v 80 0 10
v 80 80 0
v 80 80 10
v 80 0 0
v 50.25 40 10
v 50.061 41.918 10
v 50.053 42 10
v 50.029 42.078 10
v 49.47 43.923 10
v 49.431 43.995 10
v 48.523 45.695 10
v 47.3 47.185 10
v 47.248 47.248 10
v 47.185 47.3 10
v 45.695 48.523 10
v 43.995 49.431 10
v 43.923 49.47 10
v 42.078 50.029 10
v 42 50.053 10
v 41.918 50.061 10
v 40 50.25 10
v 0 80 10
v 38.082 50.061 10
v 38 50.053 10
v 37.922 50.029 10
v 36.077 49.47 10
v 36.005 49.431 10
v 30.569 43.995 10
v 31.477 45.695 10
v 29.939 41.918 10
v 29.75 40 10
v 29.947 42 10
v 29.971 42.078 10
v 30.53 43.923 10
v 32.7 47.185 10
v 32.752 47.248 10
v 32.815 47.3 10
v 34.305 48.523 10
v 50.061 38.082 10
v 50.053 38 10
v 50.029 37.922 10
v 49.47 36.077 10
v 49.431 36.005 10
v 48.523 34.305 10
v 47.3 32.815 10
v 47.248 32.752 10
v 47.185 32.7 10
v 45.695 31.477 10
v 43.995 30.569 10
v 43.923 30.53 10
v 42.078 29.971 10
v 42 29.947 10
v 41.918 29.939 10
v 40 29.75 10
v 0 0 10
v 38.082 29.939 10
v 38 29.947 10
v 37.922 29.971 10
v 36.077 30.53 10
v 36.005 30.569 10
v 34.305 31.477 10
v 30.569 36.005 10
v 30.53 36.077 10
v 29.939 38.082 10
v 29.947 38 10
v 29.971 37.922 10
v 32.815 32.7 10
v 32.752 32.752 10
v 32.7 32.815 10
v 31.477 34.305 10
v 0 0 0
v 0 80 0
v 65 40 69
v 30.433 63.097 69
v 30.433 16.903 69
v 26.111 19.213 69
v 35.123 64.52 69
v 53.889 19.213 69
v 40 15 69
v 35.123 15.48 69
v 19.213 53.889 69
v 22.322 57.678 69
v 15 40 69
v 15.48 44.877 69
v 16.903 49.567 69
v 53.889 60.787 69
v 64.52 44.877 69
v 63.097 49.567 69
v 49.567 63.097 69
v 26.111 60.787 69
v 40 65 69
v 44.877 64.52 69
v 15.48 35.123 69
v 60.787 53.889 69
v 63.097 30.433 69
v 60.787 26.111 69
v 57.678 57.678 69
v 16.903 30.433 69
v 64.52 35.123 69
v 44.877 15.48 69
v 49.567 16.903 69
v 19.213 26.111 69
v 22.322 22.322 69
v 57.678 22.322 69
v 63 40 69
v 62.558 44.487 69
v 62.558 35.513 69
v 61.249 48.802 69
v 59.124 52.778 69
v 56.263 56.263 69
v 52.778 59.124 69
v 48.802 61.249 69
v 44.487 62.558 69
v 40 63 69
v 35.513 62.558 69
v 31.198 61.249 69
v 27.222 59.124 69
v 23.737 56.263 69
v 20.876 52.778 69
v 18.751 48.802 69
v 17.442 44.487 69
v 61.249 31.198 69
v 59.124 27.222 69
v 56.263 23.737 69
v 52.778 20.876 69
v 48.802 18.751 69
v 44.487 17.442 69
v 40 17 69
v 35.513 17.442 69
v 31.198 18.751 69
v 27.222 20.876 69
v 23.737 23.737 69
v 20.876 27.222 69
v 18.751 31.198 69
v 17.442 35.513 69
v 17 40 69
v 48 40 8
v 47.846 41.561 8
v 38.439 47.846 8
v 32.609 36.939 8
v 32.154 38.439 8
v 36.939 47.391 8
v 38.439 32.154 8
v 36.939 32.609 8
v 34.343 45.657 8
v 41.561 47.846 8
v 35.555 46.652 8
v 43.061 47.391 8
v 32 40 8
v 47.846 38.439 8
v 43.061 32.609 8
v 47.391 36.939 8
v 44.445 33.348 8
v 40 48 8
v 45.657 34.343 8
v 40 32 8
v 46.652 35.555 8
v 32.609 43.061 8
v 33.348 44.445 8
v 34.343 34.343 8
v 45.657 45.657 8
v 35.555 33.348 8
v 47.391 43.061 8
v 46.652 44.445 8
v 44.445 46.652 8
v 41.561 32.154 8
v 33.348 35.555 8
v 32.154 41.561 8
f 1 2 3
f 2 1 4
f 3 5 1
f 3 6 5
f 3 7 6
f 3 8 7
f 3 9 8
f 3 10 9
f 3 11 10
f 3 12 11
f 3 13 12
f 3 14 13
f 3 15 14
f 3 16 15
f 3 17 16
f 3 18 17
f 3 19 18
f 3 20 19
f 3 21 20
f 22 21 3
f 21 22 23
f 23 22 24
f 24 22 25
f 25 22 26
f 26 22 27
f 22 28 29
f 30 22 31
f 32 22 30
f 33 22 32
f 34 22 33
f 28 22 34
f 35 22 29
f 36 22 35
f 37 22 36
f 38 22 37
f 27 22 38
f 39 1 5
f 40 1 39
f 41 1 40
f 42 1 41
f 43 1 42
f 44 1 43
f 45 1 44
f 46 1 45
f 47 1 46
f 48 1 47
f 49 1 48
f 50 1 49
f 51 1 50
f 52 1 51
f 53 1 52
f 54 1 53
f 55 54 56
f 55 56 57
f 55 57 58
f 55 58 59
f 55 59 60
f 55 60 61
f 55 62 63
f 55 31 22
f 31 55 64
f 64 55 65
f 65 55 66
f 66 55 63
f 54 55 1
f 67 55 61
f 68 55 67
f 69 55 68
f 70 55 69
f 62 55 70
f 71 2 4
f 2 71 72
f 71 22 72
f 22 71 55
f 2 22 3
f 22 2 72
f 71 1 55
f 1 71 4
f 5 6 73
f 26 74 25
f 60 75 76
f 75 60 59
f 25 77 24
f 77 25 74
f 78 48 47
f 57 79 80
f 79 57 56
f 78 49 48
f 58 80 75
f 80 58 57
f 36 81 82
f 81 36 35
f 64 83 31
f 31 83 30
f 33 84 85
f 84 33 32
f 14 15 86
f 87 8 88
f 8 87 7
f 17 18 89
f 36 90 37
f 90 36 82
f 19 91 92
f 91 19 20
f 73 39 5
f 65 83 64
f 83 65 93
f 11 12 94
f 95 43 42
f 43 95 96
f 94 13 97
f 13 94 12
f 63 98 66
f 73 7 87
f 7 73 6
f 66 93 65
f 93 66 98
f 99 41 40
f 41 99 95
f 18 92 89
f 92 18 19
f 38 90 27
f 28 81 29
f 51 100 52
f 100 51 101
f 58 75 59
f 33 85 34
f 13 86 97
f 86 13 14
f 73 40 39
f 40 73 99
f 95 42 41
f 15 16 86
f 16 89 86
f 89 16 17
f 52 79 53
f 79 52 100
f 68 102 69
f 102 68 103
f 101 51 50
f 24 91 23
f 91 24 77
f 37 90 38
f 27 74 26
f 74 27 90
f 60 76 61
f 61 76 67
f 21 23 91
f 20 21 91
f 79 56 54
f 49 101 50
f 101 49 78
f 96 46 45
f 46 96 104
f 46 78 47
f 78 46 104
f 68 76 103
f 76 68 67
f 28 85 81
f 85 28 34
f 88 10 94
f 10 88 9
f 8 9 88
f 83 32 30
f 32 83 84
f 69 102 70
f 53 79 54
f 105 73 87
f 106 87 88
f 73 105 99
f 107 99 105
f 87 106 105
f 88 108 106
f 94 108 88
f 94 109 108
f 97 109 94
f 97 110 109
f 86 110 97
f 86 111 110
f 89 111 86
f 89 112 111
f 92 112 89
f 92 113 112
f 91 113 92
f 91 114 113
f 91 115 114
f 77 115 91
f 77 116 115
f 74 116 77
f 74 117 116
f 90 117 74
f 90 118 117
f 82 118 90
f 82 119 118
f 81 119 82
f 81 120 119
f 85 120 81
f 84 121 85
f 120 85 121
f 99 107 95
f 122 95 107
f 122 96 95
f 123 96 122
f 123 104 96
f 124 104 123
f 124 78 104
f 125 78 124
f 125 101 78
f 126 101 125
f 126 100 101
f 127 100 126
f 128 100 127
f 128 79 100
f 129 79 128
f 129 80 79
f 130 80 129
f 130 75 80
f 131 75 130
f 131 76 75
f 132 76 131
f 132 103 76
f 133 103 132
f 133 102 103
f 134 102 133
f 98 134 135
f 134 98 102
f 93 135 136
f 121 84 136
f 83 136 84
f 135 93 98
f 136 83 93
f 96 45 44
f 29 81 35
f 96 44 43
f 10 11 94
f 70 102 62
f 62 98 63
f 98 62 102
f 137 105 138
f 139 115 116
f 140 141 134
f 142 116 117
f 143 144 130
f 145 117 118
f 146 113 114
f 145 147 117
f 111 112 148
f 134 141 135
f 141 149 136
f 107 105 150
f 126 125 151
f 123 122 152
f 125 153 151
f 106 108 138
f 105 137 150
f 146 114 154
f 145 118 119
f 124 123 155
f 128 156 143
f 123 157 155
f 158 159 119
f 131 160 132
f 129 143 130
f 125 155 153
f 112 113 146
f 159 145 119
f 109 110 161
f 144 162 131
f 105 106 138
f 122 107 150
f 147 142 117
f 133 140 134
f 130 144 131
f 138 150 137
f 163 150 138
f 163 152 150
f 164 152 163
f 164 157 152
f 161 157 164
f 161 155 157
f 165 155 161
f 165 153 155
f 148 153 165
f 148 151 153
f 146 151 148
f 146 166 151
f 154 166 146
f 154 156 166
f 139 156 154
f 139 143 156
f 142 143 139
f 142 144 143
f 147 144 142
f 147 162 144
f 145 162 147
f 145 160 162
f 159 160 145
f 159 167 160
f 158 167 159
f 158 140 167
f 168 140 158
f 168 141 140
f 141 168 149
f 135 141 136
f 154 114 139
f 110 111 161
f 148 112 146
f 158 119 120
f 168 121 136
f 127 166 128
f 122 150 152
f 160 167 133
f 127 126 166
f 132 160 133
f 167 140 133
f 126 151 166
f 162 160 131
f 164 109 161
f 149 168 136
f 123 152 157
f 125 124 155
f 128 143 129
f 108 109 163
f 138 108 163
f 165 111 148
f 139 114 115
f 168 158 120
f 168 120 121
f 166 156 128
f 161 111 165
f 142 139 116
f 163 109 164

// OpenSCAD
$fn = 32;

// ----------------------------------------------------------------------
// Hopper: funnel with square flange
// ----------------------------------------------------------------------

// --- parameters (mm) ---
fl = 80;                  // flange side, X and Y
fl_t = 10;                // flange thickness
cone_h = 60;              // cone height above the flange
top_d = 50;               // cone mouth diameter
bot_d = 20;               // cone spout diameter
wall = 2;                 // cone wall thickness
fit_tol = 0.02;           // tolerance for press fits, mm
free_tol = 0.2;           // tolerance for clearance fits, mm

bore_d = bot_d - 2 * wall;  // spout bore diameter
total_h = fl_t + cone_h - 1;  // overall height

difference() {
  union() {
    cube([fl, fl, fl_t]);
    translate([fl / 2, fl / 2, fl_t - 1])
      cylinder(h = cone_h, d1 = bot_d, d2 = top_d);
  }
  translate([fl / 2, fl / 2, fl_t - 2])
    cylinder(h = cone_h + 1, d1 = bore_d, d2 = top_d - 2 * wall);
}
